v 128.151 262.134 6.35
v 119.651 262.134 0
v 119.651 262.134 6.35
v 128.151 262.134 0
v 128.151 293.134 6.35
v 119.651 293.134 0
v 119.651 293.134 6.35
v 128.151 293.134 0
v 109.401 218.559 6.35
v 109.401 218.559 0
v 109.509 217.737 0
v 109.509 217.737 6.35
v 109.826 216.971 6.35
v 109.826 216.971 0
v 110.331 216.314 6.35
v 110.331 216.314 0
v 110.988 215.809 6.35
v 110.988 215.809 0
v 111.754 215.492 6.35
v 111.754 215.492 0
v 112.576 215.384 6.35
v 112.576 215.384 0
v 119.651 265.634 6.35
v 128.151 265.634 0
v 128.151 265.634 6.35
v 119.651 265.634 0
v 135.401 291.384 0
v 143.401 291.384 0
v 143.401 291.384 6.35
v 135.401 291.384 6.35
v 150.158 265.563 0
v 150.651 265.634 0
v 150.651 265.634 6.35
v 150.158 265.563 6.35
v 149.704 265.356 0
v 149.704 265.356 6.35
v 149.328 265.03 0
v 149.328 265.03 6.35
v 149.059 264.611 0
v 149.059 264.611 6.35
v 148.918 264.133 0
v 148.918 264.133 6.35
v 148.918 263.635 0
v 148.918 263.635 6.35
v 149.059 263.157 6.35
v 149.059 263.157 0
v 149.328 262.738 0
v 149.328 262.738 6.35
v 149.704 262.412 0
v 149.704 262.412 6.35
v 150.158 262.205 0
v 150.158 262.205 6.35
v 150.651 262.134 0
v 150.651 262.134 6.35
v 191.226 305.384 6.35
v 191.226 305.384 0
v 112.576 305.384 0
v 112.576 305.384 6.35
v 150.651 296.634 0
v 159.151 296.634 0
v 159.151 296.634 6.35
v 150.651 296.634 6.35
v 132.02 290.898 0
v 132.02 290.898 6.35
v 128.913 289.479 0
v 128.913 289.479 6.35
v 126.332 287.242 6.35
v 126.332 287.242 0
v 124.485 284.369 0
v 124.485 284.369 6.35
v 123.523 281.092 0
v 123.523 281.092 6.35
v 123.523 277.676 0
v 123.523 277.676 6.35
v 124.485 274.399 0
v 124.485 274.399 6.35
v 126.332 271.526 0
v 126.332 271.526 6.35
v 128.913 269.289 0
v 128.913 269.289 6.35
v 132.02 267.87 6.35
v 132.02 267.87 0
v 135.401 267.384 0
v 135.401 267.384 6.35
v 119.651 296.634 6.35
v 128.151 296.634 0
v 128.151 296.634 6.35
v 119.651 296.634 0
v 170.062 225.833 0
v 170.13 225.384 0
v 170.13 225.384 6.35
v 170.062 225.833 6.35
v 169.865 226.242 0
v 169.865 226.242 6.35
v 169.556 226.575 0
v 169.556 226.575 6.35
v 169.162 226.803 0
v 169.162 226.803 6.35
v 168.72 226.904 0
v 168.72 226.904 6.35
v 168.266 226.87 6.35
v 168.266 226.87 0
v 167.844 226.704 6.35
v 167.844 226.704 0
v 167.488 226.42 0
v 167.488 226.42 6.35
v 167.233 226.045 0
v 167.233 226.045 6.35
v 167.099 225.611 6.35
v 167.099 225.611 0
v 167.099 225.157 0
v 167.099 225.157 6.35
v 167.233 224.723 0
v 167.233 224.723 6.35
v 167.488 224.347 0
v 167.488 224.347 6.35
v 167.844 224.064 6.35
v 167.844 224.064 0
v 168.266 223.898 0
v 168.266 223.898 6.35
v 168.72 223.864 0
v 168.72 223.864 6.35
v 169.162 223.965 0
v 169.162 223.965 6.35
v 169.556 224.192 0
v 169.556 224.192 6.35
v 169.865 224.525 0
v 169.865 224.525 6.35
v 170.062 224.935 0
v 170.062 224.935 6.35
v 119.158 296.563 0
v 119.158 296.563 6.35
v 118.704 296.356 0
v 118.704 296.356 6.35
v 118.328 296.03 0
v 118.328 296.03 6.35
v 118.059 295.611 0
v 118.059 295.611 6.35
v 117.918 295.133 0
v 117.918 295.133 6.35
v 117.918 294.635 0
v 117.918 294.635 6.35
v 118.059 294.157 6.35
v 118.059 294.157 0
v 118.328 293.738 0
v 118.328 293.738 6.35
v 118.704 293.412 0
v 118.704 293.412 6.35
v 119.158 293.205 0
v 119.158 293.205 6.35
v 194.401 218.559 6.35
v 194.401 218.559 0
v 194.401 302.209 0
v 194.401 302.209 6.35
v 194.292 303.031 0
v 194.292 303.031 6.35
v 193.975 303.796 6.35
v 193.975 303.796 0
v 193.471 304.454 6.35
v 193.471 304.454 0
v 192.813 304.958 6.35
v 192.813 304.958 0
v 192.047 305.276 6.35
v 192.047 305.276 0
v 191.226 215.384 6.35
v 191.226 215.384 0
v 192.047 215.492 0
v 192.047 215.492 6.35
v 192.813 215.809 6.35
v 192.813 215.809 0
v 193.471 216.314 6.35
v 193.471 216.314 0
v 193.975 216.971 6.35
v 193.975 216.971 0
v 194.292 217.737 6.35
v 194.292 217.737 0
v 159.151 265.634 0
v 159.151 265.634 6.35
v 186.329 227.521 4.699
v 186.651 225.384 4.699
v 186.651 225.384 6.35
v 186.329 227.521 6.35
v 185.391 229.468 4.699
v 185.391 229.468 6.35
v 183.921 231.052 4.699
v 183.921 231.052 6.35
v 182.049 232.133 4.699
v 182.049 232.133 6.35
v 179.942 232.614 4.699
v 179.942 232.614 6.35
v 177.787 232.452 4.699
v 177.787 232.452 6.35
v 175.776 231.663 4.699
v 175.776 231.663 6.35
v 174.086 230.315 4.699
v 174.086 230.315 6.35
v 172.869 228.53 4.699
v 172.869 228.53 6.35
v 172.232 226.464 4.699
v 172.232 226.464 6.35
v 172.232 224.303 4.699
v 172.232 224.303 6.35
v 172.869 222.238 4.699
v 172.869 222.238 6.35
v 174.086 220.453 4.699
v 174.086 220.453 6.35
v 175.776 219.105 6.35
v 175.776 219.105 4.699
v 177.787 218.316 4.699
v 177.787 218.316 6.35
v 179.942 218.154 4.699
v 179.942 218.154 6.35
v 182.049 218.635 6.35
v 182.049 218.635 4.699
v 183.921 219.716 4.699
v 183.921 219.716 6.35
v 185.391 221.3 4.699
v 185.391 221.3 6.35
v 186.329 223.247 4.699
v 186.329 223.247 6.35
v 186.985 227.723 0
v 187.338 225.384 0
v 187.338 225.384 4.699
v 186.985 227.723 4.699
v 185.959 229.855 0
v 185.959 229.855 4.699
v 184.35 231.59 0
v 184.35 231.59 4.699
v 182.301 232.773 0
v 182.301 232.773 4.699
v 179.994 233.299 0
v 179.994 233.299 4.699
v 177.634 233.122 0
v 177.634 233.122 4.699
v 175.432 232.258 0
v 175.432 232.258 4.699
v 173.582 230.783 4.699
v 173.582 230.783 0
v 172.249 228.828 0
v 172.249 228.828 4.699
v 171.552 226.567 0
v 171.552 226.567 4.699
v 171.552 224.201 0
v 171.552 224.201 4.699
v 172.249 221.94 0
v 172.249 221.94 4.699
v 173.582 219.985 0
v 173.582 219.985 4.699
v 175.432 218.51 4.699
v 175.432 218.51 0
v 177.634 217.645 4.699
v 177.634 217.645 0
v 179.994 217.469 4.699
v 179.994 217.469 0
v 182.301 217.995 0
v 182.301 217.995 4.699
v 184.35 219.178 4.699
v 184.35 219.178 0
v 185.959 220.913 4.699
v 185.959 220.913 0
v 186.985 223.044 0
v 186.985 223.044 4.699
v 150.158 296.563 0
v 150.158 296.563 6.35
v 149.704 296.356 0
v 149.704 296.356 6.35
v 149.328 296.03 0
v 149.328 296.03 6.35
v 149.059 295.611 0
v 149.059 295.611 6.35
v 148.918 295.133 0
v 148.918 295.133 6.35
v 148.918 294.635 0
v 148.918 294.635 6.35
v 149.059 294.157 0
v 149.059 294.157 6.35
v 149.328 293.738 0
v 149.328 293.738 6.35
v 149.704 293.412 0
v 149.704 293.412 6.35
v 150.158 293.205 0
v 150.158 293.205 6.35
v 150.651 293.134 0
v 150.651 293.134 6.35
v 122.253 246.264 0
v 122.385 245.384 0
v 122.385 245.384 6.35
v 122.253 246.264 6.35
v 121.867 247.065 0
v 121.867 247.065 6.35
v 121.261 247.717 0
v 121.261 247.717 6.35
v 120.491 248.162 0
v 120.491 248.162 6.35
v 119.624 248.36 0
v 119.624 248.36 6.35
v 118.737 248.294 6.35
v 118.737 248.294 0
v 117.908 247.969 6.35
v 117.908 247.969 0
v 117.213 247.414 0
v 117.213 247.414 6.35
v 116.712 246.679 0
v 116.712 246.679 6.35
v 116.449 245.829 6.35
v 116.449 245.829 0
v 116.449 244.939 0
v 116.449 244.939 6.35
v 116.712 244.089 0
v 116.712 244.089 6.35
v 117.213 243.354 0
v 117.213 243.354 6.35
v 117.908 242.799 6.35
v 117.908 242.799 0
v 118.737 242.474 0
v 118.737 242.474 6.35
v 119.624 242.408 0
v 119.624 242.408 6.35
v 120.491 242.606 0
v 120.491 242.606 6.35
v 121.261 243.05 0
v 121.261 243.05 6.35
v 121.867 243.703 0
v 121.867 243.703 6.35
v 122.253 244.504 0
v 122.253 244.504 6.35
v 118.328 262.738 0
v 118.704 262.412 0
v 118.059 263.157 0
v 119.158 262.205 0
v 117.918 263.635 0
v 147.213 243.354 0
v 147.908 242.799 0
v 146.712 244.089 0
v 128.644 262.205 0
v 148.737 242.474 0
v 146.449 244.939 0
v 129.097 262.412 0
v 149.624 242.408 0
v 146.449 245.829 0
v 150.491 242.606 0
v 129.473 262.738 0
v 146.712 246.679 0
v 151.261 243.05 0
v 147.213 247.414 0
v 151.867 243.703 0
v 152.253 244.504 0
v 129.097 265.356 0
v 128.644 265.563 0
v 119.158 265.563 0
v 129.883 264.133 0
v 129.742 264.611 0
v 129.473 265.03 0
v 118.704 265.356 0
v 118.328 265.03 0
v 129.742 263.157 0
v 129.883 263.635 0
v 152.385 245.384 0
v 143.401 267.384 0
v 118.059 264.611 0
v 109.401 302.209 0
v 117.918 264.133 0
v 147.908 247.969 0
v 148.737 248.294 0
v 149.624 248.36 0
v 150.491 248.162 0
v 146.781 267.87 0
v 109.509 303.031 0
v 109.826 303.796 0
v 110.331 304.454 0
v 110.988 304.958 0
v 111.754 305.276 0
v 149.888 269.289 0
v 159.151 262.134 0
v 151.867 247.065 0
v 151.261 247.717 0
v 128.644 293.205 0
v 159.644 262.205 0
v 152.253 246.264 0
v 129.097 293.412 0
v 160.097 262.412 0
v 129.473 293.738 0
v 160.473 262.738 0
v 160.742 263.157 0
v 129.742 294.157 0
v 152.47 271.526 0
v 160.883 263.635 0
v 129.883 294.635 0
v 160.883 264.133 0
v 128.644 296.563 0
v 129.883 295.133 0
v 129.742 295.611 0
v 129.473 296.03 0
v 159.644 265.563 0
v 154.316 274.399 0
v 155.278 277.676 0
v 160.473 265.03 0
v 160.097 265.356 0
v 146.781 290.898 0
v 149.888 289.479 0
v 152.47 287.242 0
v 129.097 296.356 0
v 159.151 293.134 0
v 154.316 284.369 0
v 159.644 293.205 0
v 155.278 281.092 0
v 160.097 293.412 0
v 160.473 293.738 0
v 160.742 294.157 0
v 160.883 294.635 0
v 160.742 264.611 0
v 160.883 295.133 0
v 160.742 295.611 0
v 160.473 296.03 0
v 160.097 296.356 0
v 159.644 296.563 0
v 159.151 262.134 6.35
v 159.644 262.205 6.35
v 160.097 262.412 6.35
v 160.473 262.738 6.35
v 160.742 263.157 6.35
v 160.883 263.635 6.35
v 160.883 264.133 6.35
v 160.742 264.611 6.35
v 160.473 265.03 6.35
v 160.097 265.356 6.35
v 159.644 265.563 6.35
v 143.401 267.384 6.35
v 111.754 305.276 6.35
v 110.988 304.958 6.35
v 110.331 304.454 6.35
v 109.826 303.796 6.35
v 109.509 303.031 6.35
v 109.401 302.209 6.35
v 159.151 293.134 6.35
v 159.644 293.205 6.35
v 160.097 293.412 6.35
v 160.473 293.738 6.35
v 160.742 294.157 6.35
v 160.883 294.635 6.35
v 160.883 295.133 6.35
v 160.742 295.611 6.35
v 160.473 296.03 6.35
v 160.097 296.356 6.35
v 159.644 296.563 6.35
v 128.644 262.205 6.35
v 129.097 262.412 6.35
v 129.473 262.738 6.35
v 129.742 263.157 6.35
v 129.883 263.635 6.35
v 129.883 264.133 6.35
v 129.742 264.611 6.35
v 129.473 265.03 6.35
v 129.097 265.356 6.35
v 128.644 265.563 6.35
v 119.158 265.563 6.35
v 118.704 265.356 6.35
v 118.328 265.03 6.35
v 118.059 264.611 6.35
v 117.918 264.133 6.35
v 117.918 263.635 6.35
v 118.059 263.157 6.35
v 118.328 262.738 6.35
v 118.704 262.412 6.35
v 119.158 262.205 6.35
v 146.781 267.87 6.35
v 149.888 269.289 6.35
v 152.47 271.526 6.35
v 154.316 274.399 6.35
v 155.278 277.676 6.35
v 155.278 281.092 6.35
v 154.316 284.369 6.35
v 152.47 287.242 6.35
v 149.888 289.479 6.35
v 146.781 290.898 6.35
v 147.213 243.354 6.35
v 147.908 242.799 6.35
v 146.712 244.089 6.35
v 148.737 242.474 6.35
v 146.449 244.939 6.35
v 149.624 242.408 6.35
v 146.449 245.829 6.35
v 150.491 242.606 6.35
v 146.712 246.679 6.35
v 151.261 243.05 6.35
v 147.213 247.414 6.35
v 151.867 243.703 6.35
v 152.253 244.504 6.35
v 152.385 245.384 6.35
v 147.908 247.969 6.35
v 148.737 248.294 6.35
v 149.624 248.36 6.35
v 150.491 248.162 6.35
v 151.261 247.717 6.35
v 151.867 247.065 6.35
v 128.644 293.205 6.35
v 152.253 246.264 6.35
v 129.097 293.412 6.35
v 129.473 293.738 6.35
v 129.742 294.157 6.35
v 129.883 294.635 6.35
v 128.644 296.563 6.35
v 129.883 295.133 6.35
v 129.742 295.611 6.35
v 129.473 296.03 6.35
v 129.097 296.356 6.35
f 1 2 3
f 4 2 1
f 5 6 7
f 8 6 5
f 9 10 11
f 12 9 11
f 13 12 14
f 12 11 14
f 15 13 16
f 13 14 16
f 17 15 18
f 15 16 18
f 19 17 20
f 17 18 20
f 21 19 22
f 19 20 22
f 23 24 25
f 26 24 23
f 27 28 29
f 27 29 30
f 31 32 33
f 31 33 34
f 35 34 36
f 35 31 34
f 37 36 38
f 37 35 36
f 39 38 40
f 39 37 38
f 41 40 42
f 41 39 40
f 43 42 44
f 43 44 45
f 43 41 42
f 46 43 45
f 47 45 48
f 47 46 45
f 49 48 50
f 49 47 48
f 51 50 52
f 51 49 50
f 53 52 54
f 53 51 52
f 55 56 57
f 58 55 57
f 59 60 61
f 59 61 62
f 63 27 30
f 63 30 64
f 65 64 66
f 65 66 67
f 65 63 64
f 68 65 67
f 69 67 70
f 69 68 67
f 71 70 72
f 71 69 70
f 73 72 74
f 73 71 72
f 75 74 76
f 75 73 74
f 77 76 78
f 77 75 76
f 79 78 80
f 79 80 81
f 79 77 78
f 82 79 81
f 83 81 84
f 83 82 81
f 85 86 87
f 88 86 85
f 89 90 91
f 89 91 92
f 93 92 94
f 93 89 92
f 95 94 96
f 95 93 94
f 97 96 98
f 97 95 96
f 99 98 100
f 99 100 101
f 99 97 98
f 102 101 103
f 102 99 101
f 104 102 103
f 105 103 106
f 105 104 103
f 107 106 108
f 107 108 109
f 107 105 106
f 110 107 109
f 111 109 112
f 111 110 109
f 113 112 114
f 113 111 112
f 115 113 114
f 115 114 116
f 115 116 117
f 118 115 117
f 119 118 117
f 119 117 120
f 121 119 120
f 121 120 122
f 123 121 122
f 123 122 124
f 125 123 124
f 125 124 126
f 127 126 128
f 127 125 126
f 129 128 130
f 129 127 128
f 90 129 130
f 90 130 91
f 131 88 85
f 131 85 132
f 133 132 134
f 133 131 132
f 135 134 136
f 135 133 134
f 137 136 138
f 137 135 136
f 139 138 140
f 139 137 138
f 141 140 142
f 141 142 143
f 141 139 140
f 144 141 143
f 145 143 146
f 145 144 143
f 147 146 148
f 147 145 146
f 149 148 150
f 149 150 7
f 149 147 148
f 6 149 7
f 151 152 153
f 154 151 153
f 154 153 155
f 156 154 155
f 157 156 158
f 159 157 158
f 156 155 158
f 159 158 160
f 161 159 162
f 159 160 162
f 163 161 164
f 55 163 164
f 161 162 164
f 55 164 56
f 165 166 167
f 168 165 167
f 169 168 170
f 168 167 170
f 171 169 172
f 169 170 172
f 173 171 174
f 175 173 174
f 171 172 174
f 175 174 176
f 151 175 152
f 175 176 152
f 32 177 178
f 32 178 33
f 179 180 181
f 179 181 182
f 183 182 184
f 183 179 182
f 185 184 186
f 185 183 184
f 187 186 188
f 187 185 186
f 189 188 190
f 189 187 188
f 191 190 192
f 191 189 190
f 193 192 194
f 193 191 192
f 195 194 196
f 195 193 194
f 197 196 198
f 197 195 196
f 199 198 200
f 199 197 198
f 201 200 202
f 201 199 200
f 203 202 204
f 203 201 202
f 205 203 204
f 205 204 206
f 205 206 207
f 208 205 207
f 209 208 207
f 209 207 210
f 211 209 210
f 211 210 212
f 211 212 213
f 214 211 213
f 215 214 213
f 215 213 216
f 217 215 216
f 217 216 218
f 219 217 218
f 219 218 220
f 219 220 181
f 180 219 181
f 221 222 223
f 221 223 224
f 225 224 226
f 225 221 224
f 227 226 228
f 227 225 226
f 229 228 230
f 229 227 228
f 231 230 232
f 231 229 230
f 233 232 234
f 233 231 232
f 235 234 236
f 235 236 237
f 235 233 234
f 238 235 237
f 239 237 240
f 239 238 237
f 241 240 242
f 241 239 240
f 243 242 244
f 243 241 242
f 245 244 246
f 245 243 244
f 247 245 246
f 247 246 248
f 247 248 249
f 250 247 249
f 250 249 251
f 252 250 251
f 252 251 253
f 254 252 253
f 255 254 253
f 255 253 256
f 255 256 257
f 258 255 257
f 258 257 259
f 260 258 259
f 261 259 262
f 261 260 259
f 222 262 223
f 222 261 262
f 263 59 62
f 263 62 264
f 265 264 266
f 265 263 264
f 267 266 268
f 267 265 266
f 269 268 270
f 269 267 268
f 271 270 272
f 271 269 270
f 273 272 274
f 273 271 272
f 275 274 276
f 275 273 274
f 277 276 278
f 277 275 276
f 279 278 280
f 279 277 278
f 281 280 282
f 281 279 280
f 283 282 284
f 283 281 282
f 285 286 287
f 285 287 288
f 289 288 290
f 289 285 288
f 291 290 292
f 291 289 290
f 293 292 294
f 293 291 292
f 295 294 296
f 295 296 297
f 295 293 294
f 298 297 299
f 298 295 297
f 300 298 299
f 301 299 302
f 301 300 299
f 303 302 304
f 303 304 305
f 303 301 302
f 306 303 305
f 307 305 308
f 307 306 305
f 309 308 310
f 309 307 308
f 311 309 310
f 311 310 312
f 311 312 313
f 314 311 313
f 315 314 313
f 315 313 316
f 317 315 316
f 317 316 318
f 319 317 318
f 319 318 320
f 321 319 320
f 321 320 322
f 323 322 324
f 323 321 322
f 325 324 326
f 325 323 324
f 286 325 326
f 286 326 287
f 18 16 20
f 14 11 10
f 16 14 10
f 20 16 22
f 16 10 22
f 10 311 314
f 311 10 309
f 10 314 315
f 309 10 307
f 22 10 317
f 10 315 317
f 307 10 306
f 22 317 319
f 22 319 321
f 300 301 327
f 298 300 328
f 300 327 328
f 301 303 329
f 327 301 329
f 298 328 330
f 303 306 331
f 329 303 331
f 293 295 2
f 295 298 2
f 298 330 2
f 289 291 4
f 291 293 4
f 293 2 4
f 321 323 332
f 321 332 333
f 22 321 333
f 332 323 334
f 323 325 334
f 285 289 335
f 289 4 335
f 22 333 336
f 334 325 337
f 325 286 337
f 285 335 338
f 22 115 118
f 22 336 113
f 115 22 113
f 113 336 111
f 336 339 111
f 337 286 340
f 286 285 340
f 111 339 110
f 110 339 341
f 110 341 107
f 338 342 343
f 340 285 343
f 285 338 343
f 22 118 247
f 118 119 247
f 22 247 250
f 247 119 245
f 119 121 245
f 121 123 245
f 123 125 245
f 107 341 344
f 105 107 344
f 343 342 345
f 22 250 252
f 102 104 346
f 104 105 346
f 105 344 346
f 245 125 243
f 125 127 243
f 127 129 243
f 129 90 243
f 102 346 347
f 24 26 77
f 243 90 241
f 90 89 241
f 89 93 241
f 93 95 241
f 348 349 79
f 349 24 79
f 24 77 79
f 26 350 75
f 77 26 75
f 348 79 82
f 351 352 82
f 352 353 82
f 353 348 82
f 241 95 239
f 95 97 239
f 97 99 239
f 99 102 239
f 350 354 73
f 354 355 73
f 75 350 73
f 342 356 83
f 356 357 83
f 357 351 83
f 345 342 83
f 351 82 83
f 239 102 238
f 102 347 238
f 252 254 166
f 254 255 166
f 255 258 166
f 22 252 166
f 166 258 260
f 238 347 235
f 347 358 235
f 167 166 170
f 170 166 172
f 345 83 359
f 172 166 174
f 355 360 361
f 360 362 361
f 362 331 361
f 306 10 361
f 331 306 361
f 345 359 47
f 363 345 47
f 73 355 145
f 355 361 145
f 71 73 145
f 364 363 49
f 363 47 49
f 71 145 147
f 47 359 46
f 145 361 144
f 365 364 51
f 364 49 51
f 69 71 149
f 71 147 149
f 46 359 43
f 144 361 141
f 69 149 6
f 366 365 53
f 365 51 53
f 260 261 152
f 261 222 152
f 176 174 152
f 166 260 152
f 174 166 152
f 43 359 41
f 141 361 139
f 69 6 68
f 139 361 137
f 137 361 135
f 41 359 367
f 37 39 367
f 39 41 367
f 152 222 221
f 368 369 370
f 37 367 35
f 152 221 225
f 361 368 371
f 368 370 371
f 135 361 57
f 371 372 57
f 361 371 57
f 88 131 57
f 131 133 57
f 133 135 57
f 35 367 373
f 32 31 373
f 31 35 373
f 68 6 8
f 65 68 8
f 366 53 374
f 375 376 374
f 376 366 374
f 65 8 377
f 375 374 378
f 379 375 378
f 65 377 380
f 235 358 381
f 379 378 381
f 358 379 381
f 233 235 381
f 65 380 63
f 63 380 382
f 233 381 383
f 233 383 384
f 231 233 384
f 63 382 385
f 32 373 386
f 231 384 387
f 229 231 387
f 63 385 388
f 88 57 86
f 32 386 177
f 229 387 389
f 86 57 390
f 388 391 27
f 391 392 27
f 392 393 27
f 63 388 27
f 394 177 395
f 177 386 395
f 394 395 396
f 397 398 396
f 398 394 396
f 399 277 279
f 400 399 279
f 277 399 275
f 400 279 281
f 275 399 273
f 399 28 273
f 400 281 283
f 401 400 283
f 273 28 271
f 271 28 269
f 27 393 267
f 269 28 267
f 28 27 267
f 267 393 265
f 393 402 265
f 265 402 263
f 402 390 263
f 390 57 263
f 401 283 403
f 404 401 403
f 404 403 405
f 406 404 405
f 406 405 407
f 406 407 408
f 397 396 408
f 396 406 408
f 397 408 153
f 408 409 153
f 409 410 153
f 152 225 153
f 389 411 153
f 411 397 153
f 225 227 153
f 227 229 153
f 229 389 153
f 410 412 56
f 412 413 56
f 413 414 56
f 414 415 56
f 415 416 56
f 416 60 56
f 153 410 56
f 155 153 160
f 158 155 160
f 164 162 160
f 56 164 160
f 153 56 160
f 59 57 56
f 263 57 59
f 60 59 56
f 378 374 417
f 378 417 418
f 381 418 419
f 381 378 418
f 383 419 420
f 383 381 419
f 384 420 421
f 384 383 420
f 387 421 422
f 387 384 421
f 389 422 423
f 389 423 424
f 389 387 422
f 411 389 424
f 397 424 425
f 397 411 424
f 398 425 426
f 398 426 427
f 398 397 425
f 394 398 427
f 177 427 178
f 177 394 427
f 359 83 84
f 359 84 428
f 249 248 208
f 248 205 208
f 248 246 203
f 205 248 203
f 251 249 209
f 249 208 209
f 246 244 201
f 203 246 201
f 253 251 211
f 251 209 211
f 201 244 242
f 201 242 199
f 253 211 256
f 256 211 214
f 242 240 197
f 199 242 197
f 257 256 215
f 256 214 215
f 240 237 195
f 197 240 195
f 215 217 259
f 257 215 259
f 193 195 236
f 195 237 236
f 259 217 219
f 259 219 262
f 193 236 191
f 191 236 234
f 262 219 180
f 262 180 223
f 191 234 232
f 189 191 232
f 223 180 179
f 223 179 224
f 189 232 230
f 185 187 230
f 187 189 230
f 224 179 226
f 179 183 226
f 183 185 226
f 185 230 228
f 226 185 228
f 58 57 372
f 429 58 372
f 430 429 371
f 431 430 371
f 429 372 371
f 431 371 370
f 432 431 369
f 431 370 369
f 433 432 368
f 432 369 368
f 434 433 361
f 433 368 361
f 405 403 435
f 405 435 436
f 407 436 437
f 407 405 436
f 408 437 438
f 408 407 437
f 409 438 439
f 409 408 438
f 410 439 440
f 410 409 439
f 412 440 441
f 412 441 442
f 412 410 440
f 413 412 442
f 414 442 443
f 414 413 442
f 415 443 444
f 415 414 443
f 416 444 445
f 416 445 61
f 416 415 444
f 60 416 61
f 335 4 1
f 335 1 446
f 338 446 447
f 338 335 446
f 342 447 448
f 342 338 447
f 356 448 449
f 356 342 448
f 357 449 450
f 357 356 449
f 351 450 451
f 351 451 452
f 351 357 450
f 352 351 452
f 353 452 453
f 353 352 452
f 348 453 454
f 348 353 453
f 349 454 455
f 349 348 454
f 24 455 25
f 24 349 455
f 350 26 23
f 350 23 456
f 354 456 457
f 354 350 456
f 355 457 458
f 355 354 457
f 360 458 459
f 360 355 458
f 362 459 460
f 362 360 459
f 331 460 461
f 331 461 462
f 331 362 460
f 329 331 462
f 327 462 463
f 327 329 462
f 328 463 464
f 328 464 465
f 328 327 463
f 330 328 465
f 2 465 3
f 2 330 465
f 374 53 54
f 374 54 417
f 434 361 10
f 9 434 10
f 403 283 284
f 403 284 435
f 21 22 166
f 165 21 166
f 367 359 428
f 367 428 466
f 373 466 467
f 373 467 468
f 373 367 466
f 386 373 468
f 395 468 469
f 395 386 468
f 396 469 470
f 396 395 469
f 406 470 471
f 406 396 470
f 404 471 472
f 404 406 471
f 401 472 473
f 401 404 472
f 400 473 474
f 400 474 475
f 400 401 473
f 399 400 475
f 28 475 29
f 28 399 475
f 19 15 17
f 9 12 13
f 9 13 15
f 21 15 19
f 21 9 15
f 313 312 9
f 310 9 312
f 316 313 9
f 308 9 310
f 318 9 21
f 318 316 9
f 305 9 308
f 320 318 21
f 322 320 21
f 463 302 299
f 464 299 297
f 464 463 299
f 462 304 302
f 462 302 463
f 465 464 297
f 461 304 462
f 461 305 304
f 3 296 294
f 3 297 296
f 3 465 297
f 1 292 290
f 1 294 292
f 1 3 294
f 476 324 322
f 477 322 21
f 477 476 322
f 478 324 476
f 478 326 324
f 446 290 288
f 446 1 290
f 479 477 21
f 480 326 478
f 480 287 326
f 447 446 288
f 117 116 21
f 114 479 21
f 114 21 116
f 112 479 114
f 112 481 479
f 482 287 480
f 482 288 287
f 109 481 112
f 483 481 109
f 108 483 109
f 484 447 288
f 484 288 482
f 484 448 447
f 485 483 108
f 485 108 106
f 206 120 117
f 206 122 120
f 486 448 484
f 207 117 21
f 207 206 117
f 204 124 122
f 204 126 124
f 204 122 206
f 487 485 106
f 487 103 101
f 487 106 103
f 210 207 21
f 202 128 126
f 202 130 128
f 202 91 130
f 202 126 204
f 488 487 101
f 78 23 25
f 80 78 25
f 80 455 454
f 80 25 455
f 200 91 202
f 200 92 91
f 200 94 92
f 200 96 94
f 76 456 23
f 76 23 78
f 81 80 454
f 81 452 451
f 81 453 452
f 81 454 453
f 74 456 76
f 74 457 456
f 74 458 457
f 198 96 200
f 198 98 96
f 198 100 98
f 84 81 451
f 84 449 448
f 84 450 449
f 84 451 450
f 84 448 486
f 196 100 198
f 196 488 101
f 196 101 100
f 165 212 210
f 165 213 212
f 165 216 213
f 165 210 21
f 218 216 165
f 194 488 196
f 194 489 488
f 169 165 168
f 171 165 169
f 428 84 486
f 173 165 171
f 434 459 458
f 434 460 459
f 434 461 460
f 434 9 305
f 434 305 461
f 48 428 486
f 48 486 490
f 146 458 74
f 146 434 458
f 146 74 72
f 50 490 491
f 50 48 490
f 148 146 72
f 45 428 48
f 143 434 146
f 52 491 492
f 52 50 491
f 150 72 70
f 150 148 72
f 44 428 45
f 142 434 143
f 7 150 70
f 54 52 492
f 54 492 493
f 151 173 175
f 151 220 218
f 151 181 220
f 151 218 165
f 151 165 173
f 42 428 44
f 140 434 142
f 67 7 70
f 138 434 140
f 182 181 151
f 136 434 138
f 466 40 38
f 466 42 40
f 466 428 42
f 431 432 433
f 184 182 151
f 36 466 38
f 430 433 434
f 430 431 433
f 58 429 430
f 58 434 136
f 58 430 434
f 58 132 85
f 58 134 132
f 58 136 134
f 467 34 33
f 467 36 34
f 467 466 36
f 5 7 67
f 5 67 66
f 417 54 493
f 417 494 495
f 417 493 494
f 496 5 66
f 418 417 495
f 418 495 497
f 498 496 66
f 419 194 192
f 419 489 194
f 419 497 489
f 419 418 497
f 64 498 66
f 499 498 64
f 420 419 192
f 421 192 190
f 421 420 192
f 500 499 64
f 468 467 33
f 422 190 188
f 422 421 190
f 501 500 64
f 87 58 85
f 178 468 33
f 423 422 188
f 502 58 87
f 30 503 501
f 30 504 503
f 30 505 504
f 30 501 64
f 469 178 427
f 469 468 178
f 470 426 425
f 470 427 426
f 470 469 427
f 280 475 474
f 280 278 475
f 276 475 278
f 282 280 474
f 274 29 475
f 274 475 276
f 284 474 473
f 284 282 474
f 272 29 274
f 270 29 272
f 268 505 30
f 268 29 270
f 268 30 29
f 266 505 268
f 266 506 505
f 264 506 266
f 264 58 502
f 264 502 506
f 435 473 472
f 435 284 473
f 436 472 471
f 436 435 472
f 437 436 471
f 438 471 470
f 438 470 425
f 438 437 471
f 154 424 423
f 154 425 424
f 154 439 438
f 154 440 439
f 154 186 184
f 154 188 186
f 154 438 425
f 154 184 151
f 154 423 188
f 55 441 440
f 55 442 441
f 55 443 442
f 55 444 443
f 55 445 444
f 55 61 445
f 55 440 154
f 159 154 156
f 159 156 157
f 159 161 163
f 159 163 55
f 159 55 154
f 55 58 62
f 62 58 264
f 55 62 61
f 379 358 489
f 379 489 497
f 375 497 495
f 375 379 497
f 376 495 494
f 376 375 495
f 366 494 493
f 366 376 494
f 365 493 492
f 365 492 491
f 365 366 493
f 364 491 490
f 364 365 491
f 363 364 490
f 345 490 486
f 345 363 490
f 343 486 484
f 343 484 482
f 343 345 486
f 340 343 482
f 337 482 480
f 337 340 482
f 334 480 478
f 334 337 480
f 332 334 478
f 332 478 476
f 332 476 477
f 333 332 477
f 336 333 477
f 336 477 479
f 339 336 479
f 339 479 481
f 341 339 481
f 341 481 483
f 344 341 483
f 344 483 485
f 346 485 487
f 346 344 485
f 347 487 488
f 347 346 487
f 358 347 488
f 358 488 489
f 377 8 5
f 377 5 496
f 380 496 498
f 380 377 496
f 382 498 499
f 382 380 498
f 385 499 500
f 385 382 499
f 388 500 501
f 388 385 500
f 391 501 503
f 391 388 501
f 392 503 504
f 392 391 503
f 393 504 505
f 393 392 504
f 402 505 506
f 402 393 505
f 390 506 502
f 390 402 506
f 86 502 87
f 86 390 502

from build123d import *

# Parameters (mm, degrees)
SKETCH1_R           = 2.9845
SKETCH1_R_2         = 1.524
SKETCH1_R_3         = 7.250000001
BOSS_EXTRUDE1_DEPTH = 6.35
SKETCH1_3_R         = 7.9375
SKETCH1_3_R_2       = 7.250000001
CUT_EXTRUDE1_DEPTH  = 4.699


with BuildPart() as part:
    # Sketch1 → Boss-Extrude1 (new body)
    with BuildSketch(Plane.XY):
        with BuildLine():
            ThreePointArc((112.575613802, 305.383854225), (110.330549772, 304.453918255), (109.400613802, 302.208854225))
            Line((109.400613802, 302.208854225), (109.400613802, 218.558854223))
            ThreePointArc((109.400613802, 218.558854223), (110.330549772, 216.313790192), (112.575613802, 215.383854223))
            Line((112.575613802, 215.383854223), (191.225613804, 215.383854223))
            ThreePointArc((191.225613804, 215.383854223), (193.470677834, 216.313790192), (194.400613804, 218.558854223))
            Line((194.400613804, 218.558854223), (194.400613804, 302.208854225))
            ThreePointArc((194.400613804, 302.208854225), (193.470677834, 304.453918255), (191.225613804, 305.383854225))
            Line((191.225613804, 305.383854225), (112.575613802, 305.383854225))
        make_face()
        with Locations((119.400613802, 245.383854222)):
            Circle(SKETCH1_R, mode=Mode.SUBTRACT)
        with Locations((149.400613802, 245.383854222)):
            Circle(SKETCH1_R, mode=Mode.SUBTRACT)
        with Locations((168.605613802, 225.383854222)):
            Circle(SKETCH1_R_2, mode=Mode.SUBTRACT)
        with BuildLine():
            Line((128.150613802, 262.133854222), (119.650613802, 262.133854222))
            ThreePointArc((119.650613802, 262.133854222), (117.900613802, 263.883854223), (119.650613802, 265.633854223))
            Line((119.650613802, 265.633854223), (128.150613802, 265.633854223))
            ThreePointArc((128.150613802, 265.633854223), (129.900613803, 263.883854223), (128.150613802, 262.133854222))
        make_face(mode=Mode.SUBTRACT)
        with BuildLine():
            Line((143.400613803, 267.383854223), (135.400613803, 267.383854223))
            ThreePointArc((135.400613803, 267.383854223), (123.400613803, 279.383854223), (135.400613803, 291.383854224))
            Line((135.400613803, 291.383854224), (143.400613803, 291.383854224))
            ThreePointArc((143.400613803, 291.383854224), (155.400613803, 279.383854223), (143.400613803, 267.383854223))
        make_face(mode=Mode.SUBTRACT)
        with BuildLine():
            ThreePointArc((128.150613802, 296.633854224), (129.900613803, 294.883854224), (128.150613802, 293.133854224))
            Line((128.150613802, 293.133854224), (119.650613802, 293.133854224))
            ThreePointArc((119.650613802, 293.133854224), (117.900613802, 294.883854224), (119.650613802, 296.633854224))
            Line((119.650613802, 296.633854224), (128.150613802, 296.633854224))
        make_face(mode=Mode.SUBTRACT)
        with BuildLine():
            ThreePointArc((159.150613804, 265.633854223), (160.900613804, 263.883854223), (159.150613804, 262.133854222))
            Line((159.150613804, 262.133854222), (150.650613804, 262.133854222))
            ThreePointArc((150.650613804, 262.133854222), (148.900613803, 263.883854223), (150.650613804, 265.633854223))
            Line((150.650613804, 265.633854223), (159.150613804, 265.633854223))
        make_face(mode=Mode.SUBTRACT)
        with BuildLine():
            Line((159.150613804, 293.133854224), (150.650613804, 293.133854224))
            ThreePointArc((150.650613804, 293.133854224), (148.900613803, 294.883854224), (150.650613804, 296.633854224))
            Line((150.650613804, 296.633854224), (159.150613804, 296.633854224))
            ThreePointArc((159.150613804, 296.633854224), (160.900613804, 294.883854224), (159.150613804, 293.133854224))
        make_face(mode=Mode.SUBTRACT)
        with Locations((179.400613802, 225.383854222)):
            Circle(SKETCH1_R_3, mode=Mode.SUBTRACT)
    extrude(amount=BOSS_EXTRUDE1_DEPTH)

    # Sketch1<3> → Cut-Extrude1 (cut)
    with BuildSketch(Plane.XY):
        with Locations((179.400613802, 225.383854222)):
            Circle(SKETCH1_3_R)
        with Locations((179.400613802, 225.383854222)):
            Circle(SKETCH1_3_R_2, mode=Mode.SUBTRACT)
    extrude(amount=CUT_EXTRUDE1_DEPTH, mode=Mode.SUBTRACT)


solid = part.part
